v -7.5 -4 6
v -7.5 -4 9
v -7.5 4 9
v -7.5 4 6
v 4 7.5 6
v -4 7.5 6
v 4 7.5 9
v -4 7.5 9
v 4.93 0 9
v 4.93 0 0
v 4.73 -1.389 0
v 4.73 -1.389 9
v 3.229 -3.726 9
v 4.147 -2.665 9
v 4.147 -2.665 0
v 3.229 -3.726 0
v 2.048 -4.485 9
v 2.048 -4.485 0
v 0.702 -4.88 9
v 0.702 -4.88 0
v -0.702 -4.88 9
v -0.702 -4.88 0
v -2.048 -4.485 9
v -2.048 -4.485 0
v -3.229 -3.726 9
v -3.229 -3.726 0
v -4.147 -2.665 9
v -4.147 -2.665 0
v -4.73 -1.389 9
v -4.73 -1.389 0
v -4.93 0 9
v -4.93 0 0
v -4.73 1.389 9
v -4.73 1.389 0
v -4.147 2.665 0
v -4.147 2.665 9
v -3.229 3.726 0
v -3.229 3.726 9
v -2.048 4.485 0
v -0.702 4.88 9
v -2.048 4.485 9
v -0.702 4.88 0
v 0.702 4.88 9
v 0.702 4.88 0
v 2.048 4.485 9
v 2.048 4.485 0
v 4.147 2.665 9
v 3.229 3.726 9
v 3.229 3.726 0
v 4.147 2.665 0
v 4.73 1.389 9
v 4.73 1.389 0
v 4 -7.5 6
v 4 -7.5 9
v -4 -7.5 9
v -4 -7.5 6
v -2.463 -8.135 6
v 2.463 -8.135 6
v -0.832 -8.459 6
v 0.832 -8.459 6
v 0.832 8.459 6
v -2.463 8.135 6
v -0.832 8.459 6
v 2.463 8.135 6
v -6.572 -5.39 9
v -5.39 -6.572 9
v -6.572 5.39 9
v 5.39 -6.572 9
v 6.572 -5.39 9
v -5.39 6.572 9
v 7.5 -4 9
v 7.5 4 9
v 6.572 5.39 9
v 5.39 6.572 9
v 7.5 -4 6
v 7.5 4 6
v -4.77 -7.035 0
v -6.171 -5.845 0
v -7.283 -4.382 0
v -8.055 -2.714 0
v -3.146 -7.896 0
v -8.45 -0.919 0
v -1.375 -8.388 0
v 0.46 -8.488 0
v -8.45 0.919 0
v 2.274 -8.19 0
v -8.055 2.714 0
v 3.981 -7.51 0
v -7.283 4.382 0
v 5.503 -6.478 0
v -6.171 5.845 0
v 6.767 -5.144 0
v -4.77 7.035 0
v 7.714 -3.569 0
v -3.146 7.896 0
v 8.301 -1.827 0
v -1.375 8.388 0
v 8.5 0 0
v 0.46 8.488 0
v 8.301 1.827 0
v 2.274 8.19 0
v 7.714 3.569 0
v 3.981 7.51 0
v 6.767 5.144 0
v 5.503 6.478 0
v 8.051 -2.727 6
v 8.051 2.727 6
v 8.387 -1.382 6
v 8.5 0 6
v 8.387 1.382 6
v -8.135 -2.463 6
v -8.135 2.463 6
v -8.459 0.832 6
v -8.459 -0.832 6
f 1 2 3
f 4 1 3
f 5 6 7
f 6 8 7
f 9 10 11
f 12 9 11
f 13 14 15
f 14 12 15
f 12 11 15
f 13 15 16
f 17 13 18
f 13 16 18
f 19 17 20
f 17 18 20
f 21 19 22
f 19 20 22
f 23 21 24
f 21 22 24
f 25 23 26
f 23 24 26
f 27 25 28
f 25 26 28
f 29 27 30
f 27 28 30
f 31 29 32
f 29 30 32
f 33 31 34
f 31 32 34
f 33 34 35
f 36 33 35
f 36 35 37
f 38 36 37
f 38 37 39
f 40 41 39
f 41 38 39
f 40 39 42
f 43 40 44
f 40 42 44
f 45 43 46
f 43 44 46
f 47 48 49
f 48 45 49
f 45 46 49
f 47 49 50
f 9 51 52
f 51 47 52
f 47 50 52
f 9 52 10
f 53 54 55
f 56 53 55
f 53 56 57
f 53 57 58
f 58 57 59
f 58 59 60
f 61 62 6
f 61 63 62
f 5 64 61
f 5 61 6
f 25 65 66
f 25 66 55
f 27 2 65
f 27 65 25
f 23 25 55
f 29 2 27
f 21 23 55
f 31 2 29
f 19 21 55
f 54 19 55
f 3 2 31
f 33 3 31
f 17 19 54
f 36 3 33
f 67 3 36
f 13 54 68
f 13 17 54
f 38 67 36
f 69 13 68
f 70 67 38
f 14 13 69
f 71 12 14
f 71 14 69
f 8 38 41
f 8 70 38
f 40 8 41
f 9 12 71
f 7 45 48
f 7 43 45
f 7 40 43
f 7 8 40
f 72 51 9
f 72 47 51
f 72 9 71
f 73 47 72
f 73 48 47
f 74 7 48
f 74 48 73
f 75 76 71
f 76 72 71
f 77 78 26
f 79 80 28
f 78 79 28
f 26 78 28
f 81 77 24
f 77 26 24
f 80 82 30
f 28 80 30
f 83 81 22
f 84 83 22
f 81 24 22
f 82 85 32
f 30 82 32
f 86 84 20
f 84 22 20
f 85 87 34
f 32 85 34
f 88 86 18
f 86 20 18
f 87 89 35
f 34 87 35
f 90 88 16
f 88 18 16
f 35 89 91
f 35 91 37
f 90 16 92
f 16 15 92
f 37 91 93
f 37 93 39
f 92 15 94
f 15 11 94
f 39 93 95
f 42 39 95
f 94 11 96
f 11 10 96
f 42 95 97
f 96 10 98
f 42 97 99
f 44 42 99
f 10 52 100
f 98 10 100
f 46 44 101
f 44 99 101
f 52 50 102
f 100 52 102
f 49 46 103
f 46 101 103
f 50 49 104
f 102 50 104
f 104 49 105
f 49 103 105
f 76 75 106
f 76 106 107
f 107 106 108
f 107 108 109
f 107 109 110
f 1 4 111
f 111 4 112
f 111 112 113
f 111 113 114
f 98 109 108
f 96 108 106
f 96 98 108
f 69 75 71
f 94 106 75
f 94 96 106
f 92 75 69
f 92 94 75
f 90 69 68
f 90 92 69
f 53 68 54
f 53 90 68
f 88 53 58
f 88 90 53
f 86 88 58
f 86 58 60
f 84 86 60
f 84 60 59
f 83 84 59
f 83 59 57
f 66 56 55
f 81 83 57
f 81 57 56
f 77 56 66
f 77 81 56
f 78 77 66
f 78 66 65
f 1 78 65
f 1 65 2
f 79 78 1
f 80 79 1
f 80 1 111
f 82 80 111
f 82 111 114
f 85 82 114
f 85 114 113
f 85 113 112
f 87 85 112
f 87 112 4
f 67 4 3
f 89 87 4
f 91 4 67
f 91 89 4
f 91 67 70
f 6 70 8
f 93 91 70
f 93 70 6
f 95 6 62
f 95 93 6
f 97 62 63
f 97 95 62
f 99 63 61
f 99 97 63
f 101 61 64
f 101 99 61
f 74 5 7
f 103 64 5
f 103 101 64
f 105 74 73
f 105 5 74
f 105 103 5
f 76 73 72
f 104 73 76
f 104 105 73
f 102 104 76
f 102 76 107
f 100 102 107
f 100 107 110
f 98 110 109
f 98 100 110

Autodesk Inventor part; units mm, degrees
ref_plane "YZ Plane" through (0, 0, 0) normal (1, 0, 0) x (0, 1, 0)
ref_plane "XZ Plane" through (0, 0, 0) normal (0, 1, 0) x (-1, 0, 0)
ref_plane "XY Plane" through (0, 0, 0) normal (0, 0, 1) x (1, 0, 0)
sketch "Sketch1" plane through (0, 0, 0) normal (0, 0, 1) x (1, 0, 0)
  circle A0 centre (0, 0) radius 4.9301
  circle A1 centre (0, 0) radius 8.5
  dimension "d0" = 9.8602
  dimension "d1" = 17
extrude "Extrusion1" add sketch "Sketch1" along normal blind 9
sketch "Sketch2" plane through (0, 0, 9) normal (0, 0, 1) x (1, 0, 0)
  line L0 (-7.5, 7.5) -> (7.5, 7.5)
  line L1 (7.5, 7.5) -> (7.5, -7.5)
  line L2 (7.5, -7.5) -> (-7.5, -7.5)
  line L3 (-7.5, -7.5) -> (-7.5, 7.5)
  line L4 (0, 0) -> (0, 8.3867)
  line L5 (0, 0) -> (9.7878, 0)
  circle A0 centre (0, 0) radius 10.6066
  point P0 (0, 7.5)
  point P1 (7.5, 0)
  dimension "d4" = 15
extrude "Extrusion2" cut sketch "Sketch2" against normal blind 3 contours A0 L0 | L3 A0 | L2 A0 | A0 L1
properties part number "TuercaD_eje" material "Steel"
